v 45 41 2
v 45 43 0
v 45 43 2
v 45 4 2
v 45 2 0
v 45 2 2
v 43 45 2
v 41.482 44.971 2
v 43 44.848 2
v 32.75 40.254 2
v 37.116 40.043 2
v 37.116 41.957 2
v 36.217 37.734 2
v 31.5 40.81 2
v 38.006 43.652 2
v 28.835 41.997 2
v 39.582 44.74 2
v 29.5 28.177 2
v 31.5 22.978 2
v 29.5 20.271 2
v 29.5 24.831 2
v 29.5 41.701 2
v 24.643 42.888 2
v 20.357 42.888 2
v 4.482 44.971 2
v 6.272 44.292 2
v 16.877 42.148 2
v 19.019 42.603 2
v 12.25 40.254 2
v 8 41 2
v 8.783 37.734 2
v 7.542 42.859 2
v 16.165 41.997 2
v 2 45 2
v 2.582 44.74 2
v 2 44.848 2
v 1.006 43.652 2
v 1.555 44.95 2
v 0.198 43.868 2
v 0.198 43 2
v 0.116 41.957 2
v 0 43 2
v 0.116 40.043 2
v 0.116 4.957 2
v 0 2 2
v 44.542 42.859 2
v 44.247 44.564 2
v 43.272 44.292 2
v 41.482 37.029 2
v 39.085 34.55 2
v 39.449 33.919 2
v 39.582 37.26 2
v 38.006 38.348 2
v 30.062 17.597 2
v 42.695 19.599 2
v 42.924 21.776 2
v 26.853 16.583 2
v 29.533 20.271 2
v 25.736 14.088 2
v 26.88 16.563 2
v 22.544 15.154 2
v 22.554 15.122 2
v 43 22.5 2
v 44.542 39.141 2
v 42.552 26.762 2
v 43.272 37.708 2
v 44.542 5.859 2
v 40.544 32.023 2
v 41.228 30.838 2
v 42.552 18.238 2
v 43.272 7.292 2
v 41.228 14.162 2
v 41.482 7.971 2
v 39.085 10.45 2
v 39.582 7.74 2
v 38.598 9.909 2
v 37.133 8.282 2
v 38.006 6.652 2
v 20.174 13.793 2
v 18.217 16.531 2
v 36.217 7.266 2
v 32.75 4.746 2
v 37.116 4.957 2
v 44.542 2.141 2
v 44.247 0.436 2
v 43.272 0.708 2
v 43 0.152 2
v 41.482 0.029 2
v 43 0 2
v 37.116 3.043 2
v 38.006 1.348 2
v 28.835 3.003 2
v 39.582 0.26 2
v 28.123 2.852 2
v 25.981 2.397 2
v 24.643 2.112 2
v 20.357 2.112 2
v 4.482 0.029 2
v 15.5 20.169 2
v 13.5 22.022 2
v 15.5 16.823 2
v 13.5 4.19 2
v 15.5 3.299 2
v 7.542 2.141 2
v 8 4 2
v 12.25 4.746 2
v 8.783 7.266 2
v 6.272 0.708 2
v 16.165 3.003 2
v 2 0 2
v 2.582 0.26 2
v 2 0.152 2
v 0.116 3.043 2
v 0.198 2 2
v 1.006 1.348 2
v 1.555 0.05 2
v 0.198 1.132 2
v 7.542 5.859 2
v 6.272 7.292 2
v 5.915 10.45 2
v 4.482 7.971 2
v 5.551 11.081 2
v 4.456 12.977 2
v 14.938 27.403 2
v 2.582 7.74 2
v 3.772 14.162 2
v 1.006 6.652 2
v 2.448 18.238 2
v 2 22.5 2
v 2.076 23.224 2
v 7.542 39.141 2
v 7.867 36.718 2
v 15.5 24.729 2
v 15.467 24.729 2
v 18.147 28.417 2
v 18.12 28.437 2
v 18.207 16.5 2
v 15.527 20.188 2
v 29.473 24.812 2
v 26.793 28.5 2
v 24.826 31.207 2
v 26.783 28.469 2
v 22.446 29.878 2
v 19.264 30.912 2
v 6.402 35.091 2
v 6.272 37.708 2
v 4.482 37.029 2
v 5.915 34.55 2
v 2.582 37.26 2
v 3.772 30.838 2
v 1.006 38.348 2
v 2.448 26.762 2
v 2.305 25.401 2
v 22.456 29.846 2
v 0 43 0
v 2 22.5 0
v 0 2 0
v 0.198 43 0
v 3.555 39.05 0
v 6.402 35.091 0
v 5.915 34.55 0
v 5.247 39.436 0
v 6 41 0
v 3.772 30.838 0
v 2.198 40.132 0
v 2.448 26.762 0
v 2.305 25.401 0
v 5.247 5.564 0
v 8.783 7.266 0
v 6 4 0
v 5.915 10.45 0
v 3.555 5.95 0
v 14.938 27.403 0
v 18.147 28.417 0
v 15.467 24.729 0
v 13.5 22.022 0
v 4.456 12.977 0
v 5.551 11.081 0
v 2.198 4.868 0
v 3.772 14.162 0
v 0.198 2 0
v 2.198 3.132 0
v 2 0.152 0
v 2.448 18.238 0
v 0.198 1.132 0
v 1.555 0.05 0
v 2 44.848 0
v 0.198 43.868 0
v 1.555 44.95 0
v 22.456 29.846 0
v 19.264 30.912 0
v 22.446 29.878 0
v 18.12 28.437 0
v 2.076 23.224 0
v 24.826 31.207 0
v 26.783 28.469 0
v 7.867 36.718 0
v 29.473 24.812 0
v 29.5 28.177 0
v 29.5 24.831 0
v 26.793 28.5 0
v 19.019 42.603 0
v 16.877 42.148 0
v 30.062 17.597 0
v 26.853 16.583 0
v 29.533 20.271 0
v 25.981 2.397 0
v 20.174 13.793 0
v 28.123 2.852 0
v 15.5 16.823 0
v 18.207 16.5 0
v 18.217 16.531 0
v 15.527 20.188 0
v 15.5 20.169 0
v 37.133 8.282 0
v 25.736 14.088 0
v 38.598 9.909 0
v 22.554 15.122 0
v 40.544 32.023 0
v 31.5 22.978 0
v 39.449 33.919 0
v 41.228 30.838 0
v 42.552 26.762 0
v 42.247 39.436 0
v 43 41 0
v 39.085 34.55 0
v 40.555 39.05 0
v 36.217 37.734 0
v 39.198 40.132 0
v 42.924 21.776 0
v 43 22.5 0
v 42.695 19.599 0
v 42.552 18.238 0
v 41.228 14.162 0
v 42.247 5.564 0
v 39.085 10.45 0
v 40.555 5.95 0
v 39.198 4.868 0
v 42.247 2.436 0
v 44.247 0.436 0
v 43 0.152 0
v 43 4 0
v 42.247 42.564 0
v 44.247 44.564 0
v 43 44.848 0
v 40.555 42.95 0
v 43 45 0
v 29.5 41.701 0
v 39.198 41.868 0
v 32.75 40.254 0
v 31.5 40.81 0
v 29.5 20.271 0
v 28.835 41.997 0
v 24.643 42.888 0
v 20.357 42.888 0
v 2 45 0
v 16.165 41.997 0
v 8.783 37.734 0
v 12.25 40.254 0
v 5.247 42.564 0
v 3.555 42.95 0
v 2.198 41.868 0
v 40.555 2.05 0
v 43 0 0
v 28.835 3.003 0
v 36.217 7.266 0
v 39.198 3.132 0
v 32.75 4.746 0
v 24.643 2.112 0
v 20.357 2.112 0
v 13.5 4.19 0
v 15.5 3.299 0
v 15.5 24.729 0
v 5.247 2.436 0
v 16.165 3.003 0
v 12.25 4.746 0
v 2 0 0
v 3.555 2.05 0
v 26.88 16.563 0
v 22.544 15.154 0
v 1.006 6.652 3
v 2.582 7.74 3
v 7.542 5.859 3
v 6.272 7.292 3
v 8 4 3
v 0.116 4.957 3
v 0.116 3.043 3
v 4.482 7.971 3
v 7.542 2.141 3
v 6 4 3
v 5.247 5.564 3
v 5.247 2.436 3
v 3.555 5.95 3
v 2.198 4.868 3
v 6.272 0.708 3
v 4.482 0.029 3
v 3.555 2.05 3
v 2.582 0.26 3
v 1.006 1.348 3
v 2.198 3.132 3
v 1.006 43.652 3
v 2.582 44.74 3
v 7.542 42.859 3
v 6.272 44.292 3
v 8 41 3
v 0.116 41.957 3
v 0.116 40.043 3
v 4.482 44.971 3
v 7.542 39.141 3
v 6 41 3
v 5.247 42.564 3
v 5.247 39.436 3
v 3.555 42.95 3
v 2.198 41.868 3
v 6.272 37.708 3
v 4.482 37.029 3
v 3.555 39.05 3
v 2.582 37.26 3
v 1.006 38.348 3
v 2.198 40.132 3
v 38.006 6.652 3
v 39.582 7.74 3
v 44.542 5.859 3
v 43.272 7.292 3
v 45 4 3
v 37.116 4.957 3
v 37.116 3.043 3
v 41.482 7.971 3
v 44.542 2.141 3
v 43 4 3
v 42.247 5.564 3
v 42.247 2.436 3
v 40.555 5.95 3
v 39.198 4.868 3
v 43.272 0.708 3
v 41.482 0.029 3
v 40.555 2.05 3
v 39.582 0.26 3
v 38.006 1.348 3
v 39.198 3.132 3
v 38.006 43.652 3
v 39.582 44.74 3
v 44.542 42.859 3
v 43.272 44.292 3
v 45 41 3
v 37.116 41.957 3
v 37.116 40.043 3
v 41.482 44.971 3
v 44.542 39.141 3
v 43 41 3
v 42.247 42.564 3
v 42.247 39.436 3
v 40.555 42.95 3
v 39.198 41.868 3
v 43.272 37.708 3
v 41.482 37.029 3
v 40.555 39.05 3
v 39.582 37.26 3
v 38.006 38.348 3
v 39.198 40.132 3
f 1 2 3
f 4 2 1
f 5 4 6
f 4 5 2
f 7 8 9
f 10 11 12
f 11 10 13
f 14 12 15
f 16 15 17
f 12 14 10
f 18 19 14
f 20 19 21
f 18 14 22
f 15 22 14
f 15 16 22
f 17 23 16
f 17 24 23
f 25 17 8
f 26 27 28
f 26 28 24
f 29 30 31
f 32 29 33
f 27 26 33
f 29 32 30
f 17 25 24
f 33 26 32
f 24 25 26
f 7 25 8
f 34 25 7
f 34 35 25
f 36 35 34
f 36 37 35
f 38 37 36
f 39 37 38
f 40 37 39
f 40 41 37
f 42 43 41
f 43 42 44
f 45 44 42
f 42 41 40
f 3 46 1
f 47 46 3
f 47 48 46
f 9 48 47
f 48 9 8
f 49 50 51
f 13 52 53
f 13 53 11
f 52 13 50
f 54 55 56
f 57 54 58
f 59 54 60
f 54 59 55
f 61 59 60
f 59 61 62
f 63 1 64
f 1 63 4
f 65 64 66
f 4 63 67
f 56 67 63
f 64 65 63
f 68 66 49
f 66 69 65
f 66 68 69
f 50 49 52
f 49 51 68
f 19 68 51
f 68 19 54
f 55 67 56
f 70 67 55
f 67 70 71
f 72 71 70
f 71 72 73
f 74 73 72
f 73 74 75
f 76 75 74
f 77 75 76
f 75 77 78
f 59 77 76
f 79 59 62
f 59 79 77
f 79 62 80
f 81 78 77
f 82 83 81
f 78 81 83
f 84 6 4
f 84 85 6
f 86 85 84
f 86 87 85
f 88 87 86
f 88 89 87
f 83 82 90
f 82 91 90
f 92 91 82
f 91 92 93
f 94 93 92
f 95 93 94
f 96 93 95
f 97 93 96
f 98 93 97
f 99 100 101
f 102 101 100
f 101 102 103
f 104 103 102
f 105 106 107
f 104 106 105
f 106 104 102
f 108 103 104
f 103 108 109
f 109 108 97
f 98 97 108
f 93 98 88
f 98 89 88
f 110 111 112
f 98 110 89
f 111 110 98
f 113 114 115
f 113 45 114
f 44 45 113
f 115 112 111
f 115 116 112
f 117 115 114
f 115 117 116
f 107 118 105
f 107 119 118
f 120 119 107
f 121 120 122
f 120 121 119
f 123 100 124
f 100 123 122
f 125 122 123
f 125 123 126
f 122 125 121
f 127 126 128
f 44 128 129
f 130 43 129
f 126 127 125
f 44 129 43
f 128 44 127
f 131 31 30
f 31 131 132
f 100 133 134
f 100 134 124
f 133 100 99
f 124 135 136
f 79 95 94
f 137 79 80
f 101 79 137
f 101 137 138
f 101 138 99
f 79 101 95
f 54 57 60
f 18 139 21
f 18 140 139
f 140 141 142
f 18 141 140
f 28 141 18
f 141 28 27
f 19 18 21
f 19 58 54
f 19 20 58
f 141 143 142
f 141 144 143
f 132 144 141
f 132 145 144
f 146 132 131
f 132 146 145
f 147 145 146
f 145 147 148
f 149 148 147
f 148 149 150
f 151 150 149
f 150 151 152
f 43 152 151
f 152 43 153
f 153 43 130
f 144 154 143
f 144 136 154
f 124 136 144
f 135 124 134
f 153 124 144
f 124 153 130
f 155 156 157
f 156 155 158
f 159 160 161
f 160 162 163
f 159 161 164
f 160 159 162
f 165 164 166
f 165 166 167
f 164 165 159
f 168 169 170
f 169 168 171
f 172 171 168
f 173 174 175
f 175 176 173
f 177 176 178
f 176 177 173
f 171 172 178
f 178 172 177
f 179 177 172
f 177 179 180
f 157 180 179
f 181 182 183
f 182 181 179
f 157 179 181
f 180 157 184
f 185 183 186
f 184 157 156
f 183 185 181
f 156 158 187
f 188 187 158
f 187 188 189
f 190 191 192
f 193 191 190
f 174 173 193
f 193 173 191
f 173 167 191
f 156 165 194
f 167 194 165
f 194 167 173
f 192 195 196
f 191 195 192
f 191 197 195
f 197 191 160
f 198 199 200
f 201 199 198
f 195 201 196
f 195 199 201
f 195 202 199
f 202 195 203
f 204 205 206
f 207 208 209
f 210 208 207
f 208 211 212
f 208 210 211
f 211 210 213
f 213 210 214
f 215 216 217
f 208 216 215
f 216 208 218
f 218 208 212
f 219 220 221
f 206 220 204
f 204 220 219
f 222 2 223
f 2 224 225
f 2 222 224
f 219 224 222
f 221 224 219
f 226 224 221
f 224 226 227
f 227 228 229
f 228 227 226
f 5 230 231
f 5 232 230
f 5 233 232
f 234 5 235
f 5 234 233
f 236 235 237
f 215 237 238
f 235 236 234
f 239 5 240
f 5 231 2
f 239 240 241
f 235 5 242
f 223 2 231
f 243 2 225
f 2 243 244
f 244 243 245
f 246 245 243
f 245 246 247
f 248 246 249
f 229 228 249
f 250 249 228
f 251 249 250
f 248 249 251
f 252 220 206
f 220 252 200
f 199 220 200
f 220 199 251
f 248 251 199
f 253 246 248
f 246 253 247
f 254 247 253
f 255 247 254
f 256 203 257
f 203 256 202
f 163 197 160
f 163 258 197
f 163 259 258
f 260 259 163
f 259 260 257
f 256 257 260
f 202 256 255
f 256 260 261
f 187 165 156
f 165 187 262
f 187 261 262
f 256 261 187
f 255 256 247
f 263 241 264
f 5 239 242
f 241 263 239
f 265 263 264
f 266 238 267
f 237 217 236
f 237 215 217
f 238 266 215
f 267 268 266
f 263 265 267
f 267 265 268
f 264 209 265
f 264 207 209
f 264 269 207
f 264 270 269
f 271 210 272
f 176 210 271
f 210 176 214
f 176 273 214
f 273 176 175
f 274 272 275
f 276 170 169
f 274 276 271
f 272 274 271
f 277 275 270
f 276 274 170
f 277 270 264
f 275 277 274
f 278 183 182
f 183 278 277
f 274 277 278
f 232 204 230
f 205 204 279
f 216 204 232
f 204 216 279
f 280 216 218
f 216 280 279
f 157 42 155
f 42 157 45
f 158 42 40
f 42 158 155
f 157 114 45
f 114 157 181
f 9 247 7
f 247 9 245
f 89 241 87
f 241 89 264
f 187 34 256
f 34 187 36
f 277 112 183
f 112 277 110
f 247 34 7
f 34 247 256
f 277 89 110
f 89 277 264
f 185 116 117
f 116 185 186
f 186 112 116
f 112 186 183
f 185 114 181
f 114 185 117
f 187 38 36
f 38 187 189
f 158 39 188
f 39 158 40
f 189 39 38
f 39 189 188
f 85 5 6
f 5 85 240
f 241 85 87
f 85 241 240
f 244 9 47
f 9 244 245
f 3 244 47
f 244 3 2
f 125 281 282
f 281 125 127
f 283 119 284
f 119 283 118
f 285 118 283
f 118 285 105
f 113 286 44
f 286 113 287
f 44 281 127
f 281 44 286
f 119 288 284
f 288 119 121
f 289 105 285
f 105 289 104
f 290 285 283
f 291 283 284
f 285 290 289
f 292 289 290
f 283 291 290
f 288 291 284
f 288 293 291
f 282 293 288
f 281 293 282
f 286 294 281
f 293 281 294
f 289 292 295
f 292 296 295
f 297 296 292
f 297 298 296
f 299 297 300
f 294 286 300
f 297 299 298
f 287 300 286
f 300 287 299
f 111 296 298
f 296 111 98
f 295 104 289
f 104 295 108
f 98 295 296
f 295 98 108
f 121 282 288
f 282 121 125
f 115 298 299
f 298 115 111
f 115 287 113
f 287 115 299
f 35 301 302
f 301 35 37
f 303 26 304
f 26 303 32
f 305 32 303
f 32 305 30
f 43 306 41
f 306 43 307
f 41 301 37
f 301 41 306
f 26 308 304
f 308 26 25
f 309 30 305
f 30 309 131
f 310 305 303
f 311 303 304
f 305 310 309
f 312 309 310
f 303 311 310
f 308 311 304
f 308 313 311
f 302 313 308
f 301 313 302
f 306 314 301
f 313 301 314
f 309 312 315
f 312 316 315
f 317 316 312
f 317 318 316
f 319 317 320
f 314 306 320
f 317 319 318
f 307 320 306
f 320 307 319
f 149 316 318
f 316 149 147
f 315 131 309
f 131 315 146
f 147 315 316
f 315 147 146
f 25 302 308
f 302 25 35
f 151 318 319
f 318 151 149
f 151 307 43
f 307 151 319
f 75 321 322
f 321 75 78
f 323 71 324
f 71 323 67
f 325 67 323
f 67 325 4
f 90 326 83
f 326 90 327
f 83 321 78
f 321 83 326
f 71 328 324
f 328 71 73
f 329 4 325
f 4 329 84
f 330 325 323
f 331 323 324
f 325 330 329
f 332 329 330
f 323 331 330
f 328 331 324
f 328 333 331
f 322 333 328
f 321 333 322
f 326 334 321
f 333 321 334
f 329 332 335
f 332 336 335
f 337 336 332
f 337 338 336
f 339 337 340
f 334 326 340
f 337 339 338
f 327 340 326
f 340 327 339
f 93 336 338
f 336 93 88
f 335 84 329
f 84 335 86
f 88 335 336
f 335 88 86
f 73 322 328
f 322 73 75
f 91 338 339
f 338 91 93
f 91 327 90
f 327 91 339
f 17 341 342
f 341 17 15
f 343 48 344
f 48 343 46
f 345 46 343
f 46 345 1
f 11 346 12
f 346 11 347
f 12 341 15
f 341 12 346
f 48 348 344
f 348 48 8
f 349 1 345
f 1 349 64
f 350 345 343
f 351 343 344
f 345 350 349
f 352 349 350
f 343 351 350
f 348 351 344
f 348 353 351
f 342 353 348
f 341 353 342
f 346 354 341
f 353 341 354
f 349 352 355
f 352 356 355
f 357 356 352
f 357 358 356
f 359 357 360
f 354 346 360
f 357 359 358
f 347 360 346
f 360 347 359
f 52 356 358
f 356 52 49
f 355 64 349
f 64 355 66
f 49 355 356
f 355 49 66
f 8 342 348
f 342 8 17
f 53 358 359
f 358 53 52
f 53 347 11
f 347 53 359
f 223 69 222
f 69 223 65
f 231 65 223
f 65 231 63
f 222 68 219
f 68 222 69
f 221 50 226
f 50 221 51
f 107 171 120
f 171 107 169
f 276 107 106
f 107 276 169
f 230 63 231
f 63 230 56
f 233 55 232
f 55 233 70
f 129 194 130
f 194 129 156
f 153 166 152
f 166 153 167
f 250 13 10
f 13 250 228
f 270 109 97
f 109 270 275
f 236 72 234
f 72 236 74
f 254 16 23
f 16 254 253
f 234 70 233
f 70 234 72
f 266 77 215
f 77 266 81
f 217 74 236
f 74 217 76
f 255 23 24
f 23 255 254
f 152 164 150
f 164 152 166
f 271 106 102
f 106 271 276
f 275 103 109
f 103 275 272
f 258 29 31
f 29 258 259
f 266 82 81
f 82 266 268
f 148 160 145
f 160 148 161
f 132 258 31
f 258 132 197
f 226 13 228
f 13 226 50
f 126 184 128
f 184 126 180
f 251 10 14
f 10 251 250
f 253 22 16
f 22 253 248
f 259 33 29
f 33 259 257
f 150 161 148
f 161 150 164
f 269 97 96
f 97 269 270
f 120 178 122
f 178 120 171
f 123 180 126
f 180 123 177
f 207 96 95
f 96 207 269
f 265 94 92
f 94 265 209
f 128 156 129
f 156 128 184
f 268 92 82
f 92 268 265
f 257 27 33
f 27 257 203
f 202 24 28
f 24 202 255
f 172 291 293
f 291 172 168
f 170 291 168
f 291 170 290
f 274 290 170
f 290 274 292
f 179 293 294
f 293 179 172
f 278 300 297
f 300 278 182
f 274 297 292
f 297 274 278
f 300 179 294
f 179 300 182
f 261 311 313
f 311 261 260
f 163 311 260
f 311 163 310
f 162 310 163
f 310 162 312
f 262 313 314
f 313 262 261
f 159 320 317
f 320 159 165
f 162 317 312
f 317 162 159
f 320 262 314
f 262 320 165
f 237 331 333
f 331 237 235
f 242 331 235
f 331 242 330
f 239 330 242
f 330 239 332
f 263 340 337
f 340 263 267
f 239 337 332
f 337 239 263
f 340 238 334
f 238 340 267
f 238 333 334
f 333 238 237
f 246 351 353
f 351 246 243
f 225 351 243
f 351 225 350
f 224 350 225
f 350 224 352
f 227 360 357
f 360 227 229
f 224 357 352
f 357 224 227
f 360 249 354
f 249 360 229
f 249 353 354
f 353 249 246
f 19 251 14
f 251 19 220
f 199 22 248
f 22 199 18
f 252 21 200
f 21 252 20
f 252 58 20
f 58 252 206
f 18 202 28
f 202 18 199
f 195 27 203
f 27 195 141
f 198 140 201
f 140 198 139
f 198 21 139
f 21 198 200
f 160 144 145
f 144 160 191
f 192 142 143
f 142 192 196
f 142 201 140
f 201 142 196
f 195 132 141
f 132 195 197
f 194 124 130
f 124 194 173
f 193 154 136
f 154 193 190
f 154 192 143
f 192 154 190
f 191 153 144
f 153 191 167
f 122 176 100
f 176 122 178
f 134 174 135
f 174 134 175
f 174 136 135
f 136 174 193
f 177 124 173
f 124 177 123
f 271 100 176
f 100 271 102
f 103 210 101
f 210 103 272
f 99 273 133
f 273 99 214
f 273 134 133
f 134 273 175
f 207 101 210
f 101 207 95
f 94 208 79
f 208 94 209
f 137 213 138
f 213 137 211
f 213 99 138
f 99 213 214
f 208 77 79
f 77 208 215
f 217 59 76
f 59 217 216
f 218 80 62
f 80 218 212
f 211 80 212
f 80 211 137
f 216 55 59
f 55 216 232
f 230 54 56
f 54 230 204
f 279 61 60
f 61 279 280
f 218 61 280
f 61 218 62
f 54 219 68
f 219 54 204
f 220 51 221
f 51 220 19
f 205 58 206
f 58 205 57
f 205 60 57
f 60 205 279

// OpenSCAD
fan_grill(45);

module fan_grill(size=40) {
// Body Parameters
borderthickness=2;
cornerradius=2;
thickness=2;

dxf=false;

// Screw Hole Parameters
screwradius=4/2;
screwinset=4;

// Spine Parameters
spines=10;
spinesize=2;
spineoffset=7;
spinerotation=0;


// Below are not parameters //

// Calculate helper variables
holeradius=size/2-borderthickness;

// Create the grill
if (dxf)
	projection(cut=false) fan_grill();
else
	fan_grill();

module fan_grill()
{
	union()
	{
		difference()
		{
			body();

			// hole
			translate([size/2,size/2,0]) cylinder(r=holeradius,h=thickness);

			// screws
			#translate([screwinset,screwinset,0]) cylinder(r=screwradius,h=thickness+1);
			translate([screwinset,size-screwinset,0]) cylinder(r=screwradius,h=thickness+1);
			translate([size-screwinset,screwinset,0]) cylinder(r=screwradius,h=thickness+1);
			translate([size-screwinset,size-screwinset,0]) cylinder(r=screwradius,h=thickness+1);
		}
		translate([size/2,size/2,0])
		interrior();
	}
}

module body()
{
	union()
	{
		translate([0,cornerradius,0]) cube(size=[size,size-(cornerradius*2),thickness]);
		translate([cornerradius,0,0]) cube(size=[size-(cornerradius*2),size,thickness]);
		translate([cornerradius,cornerradius,0]) cylinder(r=cornerradius,h=thickness);
		translate([cornerradius,size-cornerradius,0]) cylinder(r=cornerradius,h=thickness);
		translate([size-cornerradius,cornerradius,0]) cylinder(r=cornerradius,h=thickness);
		translate([size-cornerradius,size-cornerradius,0]) cylinder(r=cornerradius,h=thickness);

		translate([screwinset,screwinset,0]) cylinder(r=screwradius+2,h=thickness+1);
		translate([screwinset,size-screwinset,0]) cylinder(r=screwradius+2,h=thickness+1);
		translate([size-screwinset,screwinset,0]) cylinder(r=screwradius+2,h=thickness+1);
		translate([size-screwinset,size-screwinset,0]) cylinder(r=screwradius+2,h=thickness+1);
	}
}

module interrior()
{
	for(i=[0:spines-1])
	{
		  rotate(a=[0,0,i*(360.0/spines)+spinerotation]) 
		  translate([spineoffset,-spineoffset/3.141,0])
		  cube([spinesize,holeradius+(spineoffset/3.141),thickness]);
	}
}
}
